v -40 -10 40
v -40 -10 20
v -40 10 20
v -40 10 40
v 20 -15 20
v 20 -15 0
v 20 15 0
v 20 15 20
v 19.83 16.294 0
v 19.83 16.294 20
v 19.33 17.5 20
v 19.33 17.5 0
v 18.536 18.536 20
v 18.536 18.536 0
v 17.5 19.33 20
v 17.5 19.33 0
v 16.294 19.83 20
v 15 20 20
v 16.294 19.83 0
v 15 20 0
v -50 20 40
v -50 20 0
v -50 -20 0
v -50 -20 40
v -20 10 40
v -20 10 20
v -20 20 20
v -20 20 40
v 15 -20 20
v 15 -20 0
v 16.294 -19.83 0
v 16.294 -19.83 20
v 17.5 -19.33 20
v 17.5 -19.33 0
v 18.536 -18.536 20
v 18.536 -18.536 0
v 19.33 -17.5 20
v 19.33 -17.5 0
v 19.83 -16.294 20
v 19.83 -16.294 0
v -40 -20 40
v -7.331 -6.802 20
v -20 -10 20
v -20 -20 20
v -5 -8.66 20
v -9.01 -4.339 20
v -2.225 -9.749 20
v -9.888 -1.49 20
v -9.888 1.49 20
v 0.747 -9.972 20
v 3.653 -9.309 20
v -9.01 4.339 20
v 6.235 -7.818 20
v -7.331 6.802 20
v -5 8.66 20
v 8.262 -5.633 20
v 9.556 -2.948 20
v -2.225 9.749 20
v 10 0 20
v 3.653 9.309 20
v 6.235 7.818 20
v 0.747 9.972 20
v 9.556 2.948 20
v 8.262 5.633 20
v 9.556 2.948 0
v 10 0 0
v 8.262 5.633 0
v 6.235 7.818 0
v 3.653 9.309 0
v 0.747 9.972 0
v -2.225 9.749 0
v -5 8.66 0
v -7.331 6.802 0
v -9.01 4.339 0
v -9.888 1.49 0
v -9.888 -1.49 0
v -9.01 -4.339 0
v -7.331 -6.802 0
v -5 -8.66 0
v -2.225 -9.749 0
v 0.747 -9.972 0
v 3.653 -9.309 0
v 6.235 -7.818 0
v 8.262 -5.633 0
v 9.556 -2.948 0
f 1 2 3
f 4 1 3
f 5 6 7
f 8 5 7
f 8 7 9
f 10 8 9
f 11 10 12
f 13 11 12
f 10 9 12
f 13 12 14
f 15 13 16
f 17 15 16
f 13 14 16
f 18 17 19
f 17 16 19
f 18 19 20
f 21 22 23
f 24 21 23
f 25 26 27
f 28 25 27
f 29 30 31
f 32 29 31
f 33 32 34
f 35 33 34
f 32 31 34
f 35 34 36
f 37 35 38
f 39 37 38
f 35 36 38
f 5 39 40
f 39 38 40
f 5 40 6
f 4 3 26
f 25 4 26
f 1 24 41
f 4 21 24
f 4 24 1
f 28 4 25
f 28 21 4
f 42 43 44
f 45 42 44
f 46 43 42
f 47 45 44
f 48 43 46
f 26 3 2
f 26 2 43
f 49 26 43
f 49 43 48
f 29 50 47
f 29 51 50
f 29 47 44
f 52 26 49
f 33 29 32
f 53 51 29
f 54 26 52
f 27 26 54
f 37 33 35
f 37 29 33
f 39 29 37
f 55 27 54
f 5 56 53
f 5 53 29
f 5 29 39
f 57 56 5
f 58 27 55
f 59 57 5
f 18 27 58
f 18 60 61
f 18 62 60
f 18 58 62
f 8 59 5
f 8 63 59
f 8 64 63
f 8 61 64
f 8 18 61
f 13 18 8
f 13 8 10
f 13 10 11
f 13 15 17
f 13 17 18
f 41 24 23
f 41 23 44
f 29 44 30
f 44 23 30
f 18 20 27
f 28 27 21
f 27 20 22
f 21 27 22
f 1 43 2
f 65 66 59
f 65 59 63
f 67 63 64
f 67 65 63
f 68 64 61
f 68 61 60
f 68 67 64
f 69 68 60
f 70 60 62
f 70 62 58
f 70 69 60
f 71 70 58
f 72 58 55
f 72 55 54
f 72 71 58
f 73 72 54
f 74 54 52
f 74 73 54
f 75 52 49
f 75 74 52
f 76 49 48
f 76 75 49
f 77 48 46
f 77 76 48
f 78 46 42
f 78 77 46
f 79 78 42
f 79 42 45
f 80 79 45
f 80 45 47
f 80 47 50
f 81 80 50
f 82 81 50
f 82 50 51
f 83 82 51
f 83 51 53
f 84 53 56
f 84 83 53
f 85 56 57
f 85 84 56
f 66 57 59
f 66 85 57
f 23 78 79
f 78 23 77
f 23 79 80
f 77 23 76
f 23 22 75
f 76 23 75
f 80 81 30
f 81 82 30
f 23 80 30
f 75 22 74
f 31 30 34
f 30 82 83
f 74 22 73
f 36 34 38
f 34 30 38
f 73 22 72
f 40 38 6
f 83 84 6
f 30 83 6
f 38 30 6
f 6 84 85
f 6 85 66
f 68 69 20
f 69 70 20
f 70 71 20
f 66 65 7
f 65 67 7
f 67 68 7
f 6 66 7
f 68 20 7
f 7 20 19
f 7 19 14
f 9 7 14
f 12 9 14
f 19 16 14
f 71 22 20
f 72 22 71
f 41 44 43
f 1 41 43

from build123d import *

# Parameters (mm, degrees)
F0_R     = 10
F1_DEPTH = 20
F2_DEPTH = 40
F3_SIZE  = 19.99999


# Not quite as in the source:
# - a fillet or chamfer is up to 0.001 mm smaller than in the source, because OpenCascade refuses the exact size


with BuildPart() as f1:
    # F0 (on Top) → F1 (new body)
    with BuildSketch(Plane.XY):
        with BuildLine():
            Line((15, 20), (-20, 20))
            Line((-20, 20), (-20, 10))
            Line((-20, 10), (-40, 10))
            Line((-40, 10), (-40, -10))
            Line((-40, -10), (-20, -10))
            Line((-20, -10), (-20, -20))
            Line((-20, -20), (15, -20))
            ThreePointArc((15, -20), (18.5355339059, -18.5355339059), (20, -15))
            Line((20, -15), (20, 15))
            ThreePointArc((20, 15), (18.5355339059, 18.5355339059), (15, 20))
        make_face()
        Circle(F0_R, mode=Mode.SUBTRACT)
    extrude(amount=F1_DEPTH)

    # F0 (on Top) → F2 (join)
    with BuildSketch(Plane.XY):
        Polygon((-40, 20), (-50, 20), (-50, 10), (-50, -10), (-50, -20), (-40, -20), (-20, -20), (-20, -10), (-40, -10), (-40, 10), (-20, 10), (-20, 20), align=None)
    extrude(amount=F2_DEPTH)

    # F3 (size 20 in the source; OpenCascade refuses exactly that, so slightly less here)
    f3_edges = [f1.edges().sort_by_distance(p)[0] for p in [
        (-20, -15, 40),
    ]]
    chamfer(f3_edges, length=F3_SIZE)


solid = f1.part
